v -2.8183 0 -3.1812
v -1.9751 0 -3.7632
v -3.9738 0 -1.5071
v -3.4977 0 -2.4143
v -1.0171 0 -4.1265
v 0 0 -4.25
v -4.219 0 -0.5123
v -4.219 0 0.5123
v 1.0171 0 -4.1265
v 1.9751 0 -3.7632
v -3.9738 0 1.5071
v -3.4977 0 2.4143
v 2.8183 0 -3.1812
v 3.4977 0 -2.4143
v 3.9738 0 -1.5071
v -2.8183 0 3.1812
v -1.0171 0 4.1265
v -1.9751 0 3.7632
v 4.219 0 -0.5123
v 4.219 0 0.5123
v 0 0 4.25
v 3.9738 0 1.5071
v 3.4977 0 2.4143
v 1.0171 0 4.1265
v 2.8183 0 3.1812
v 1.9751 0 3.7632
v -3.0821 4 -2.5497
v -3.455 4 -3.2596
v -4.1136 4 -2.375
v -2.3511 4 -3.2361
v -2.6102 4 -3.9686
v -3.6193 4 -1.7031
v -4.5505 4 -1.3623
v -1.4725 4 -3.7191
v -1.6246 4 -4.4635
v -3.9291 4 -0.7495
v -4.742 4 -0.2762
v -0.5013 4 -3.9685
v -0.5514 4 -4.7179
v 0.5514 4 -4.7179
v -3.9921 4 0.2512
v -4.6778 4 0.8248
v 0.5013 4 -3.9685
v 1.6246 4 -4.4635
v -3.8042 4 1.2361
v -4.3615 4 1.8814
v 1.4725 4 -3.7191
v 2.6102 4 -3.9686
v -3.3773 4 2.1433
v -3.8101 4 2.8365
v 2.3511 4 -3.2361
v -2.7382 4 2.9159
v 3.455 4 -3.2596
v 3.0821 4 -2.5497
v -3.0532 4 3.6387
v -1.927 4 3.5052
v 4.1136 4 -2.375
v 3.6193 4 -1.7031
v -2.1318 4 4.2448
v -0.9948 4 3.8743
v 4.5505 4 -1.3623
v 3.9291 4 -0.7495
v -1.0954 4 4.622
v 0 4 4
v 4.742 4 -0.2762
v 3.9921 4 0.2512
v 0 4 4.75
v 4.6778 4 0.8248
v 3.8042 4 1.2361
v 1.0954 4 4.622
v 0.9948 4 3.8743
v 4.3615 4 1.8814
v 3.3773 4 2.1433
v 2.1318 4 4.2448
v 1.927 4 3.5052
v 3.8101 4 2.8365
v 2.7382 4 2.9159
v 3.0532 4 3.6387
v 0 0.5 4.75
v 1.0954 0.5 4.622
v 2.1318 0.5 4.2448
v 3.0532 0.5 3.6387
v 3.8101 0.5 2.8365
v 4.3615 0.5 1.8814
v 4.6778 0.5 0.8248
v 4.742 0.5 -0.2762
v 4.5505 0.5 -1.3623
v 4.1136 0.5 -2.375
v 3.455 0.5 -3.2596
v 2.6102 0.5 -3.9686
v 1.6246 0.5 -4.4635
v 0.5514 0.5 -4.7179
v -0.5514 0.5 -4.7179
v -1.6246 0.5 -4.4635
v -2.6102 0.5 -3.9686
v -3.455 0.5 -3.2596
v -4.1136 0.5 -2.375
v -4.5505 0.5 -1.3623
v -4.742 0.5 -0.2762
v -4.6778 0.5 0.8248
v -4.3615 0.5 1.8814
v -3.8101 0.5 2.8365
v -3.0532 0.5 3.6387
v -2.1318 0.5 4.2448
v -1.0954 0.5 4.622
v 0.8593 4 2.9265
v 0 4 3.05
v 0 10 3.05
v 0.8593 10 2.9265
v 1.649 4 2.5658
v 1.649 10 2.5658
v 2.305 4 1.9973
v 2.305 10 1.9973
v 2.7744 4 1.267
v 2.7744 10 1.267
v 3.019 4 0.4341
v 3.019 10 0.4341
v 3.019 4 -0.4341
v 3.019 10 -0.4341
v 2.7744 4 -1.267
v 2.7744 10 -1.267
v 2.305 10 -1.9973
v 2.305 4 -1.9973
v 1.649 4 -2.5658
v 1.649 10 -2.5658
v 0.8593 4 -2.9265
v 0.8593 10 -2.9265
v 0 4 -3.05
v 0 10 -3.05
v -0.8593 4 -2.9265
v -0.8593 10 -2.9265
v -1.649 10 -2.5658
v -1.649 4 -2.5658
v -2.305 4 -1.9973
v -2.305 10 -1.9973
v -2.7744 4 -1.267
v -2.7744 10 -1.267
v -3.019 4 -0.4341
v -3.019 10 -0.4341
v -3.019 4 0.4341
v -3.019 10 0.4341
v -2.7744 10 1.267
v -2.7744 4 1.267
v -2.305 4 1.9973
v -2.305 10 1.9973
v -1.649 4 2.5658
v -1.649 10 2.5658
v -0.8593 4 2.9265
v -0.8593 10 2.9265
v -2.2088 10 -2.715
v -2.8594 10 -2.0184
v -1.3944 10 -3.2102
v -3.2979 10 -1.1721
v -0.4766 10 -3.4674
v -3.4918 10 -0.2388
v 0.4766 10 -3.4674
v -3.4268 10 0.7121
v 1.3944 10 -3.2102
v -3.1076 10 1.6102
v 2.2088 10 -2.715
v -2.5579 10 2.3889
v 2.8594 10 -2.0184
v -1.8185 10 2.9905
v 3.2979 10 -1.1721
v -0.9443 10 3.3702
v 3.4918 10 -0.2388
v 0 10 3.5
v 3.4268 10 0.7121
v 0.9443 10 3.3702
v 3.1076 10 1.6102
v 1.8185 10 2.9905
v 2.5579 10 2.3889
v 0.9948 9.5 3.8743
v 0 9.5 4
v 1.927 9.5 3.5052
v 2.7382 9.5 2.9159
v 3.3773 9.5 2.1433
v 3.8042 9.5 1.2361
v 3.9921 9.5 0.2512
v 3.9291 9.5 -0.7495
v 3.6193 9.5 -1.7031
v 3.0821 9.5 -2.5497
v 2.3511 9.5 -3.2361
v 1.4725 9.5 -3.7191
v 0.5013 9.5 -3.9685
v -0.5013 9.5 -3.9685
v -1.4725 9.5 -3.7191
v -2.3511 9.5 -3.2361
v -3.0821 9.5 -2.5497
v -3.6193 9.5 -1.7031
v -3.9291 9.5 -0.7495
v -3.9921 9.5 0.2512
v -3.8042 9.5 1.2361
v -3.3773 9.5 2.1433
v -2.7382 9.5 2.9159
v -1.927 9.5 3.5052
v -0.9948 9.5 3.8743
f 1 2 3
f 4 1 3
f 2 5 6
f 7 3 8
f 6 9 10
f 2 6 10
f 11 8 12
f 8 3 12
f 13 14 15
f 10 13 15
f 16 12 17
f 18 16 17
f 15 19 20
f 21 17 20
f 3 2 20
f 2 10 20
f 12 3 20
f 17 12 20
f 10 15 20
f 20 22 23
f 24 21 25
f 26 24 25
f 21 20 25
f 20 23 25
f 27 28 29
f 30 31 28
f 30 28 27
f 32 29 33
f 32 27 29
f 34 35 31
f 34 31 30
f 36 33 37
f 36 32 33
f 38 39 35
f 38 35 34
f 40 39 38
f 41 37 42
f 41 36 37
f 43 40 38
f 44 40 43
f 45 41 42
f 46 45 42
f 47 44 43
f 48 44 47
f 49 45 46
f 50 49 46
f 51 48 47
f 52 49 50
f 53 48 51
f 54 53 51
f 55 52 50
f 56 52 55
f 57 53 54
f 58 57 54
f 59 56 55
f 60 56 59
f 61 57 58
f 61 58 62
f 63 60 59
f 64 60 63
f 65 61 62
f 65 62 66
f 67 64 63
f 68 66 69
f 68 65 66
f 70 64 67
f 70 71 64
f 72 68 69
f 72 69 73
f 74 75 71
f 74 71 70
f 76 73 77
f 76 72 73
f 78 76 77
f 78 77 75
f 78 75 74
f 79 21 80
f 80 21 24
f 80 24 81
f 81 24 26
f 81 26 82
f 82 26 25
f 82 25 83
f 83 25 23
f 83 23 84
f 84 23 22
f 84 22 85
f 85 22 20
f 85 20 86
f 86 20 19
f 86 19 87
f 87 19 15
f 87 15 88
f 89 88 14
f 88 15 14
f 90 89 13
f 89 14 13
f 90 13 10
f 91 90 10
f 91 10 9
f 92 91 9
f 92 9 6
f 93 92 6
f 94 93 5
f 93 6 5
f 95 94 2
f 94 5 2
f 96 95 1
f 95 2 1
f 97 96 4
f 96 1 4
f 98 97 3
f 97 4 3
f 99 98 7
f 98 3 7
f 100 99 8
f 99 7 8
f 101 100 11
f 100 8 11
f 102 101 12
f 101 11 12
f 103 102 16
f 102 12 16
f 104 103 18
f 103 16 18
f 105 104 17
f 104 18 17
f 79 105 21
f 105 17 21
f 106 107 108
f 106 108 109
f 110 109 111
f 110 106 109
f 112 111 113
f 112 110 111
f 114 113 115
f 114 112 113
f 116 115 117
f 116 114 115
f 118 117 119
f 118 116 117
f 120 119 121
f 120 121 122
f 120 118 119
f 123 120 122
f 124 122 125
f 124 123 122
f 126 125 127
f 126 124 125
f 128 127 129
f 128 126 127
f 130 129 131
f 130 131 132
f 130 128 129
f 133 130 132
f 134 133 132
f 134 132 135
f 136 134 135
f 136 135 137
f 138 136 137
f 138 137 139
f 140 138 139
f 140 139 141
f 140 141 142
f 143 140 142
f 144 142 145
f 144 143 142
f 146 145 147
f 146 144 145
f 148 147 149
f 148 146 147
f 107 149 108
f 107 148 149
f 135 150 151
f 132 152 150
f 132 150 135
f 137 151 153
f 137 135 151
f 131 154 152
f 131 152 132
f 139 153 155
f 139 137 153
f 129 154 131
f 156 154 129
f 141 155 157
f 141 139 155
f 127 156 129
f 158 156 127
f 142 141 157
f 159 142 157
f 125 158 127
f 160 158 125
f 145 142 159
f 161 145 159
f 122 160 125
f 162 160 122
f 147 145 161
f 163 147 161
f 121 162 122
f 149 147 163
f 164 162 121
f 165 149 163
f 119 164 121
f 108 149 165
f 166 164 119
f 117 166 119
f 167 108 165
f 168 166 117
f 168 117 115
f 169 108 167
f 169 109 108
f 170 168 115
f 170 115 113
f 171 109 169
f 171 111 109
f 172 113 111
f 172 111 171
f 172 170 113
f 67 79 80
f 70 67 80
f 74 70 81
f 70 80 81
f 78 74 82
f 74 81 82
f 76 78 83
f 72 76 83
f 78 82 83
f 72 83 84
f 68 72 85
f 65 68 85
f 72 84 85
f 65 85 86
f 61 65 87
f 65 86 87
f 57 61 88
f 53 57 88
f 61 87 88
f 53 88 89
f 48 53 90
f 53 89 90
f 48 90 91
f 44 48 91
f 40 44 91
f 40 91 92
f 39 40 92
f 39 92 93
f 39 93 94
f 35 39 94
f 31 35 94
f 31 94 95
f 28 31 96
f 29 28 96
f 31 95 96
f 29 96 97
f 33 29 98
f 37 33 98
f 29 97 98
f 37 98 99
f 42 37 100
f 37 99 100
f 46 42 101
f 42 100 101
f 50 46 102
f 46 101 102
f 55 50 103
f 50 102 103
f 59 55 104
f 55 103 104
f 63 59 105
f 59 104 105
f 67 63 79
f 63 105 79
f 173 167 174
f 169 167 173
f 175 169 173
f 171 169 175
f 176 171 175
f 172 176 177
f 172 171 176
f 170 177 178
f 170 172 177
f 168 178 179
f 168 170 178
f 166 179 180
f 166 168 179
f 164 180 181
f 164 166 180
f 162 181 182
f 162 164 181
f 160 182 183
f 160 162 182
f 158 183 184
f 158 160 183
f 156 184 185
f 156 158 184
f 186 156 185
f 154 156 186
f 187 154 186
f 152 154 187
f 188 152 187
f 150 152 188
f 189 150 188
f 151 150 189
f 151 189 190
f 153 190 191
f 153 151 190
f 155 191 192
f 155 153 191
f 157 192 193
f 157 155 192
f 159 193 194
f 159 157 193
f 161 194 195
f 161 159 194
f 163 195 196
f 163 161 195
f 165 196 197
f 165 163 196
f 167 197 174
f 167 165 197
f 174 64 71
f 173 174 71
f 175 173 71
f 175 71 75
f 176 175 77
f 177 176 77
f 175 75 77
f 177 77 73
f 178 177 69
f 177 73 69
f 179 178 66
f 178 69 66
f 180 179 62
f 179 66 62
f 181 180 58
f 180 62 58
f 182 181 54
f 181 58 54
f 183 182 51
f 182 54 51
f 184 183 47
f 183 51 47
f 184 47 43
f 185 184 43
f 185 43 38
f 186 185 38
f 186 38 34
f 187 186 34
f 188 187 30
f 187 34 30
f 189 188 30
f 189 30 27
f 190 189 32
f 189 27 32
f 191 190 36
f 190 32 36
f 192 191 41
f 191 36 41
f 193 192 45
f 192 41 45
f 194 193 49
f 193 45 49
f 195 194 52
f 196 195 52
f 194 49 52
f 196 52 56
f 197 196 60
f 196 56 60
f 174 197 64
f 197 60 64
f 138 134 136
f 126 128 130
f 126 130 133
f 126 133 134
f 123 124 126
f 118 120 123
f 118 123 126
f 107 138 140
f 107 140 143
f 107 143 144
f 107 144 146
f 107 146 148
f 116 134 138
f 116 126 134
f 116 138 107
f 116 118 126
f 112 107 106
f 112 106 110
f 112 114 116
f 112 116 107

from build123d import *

# Parameters (mm, degrees)
SKETCH1_R           = 4.75
BOSS_EXTRUDE1_DEPTH = 4
SKETCH2_R           = 4
SKETCH2_R_2         = 3.05
BOSS_EXTRUDE2_DEPTH = 6
CHAMFER1_SIZE       = 0.5


with BuildPart() as part:
    # Sketch1 → Boss-Extrude1 (new body)
    with BuildSketch(Plane(origin=(0, 0, 0), x_dir=(1, 0, 0), z_dir=(0, 1, 0))):
        with Locations(Location((0, 0, 0), (0, 0, 270))):
            Circle(SKETCH1_R)
    extrude(amount=BOSS_EXTRUDE1_DEPTH)

    # Sketch2 → Boss-Extrude2 (add)
    with BuildSketch(Plane(origin=(0, 4, 0), x_dir=(1, 0, 0), z_dir=(0, 1, 0))):
        with Locations(Location((0, 0, 0), (0, 0, 270))):
            Circle(SKETCH2_R)
        with Locations(Location((0, 0, 0), (0, 0, 270))):
            Circle(SKETCH2_R_2, mode=Mode.SUBTRACT)
    extrude(amount=BOSS_EXTRUDE2_DEPTH)

    # Chamfer1
    chamfer1_edges = [part.edges().sort_by_distance(p)[0] for p in [
        (0, 0, -4.75),
        (0, 10, -4),
    ]]
    chamfer(chamfer1_edges, length=CHAMFER1_SIZE)


solid = part.part
